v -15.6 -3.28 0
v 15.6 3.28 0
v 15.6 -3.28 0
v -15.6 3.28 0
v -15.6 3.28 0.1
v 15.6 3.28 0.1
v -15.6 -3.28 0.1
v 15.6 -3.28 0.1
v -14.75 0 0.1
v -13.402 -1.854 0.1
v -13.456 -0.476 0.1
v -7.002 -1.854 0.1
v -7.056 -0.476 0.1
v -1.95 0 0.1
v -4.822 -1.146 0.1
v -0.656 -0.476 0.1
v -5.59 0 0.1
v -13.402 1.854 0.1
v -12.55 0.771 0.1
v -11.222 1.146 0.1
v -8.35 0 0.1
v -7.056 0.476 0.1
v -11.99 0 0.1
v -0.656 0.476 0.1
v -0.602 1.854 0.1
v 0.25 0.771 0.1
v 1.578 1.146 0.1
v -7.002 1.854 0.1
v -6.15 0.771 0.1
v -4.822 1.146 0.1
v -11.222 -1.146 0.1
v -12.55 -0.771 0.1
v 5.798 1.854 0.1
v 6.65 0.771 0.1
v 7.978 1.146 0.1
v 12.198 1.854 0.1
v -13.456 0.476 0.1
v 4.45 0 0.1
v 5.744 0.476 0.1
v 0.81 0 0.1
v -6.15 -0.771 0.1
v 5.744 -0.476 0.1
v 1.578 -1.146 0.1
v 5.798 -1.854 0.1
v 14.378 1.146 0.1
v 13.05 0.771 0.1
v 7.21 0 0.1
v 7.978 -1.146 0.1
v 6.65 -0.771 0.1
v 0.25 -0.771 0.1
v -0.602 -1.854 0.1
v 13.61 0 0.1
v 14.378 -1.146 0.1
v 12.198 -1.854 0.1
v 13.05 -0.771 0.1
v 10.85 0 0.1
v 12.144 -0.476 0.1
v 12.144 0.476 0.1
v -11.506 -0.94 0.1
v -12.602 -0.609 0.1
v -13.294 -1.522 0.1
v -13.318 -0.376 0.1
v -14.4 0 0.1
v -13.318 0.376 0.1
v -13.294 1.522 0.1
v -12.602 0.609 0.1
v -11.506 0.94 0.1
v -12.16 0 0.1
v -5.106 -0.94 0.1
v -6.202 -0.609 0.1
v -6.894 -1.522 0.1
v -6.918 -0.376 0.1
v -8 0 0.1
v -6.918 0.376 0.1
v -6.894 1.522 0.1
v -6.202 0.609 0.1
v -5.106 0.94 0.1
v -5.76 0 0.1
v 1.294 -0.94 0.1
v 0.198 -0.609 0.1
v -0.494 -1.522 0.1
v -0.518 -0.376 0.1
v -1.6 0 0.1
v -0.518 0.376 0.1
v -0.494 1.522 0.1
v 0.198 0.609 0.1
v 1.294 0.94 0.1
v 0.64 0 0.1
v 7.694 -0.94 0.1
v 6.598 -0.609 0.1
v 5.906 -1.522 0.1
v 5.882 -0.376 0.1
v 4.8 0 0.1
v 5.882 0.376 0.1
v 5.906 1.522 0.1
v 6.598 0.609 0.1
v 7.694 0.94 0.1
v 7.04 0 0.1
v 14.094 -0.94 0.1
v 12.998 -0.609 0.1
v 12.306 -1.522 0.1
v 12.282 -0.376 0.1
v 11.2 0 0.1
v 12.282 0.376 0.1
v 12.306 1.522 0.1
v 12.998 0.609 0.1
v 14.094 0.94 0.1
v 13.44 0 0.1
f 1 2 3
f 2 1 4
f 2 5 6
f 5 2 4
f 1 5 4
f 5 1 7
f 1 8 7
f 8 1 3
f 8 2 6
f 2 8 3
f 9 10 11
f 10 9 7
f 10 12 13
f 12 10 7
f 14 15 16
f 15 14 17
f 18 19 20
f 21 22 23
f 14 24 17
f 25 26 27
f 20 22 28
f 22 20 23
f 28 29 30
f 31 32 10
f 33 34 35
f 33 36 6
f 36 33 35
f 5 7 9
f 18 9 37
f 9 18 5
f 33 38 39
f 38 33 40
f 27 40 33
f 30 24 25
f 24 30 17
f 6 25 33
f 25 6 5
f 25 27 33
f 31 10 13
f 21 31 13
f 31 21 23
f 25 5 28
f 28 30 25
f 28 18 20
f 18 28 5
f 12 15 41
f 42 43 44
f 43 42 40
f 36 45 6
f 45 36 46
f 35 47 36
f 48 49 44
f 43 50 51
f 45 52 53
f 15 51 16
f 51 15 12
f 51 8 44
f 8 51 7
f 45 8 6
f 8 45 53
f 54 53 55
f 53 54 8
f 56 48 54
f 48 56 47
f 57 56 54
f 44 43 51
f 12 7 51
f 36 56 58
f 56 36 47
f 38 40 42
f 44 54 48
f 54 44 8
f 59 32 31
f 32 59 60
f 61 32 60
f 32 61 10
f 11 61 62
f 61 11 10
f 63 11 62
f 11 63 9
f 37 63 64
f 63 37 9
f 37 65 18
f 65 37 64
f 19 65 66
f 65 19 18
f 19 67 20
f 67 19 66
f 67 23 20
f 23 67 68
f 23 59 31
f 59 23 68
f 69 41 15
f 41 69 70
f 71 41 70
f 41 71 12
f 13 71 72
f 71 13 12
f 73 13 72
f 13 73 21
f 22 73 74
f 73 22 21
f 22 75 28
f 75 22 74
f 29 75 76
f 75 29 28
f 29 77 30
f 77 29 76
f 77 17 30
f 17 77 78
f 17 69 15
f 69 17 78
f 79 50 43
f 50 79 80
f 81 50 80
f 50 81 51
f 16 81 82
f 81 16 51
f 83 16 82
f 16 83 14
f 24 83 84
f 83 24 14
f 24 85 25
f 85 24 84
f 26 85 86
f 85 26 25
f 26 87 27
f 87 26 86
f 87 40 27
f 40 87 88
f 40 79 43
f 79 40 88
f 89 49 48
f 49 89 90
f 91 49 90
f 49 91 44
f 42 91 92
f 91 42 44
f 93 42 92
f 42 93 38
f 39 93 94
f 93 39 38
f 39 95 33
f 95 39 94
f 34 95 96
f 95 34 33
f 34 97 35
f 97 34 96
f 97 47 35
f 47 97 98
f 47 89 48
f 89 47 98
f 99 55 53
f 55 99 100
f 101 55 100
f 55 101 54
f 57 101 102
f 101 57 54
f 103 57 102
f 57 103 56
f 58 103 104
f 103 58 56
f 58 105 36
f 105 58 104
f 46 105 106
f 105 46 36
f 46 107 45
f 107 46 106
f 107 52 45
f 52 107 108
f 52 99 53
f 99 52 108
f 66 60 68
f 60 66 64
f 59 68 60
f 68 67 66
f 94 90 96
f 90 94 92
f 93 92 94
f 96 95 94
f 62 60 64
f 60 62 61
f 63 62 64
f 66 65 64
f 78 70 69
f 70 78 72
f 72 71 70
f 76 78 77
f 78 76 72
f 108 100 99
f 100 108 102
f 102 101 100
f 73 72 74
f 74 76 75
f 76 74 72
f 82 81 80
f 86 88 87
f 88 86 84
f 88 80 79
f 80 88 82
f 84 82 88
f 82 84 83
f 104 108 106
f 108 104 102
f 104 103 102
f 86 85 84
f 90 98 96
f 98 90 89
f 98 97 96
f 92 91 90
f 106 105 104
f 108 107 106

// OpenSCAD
// file: ../p/4-4edge.scad
use <../lib.scad>
$fa=1; $fs=0.2;
function ldraw_lib__4_4edge(realsolid=false) = [
// 0 Circle 1.0
// 0 Name: 4-4edge.dat
// 0 Author: James Jessiman
// 0 !LDRAW_ORG Primitive UPDATE 2017-01
// 0 !LICENSE Licensed under CC BY 2.0 and CC BY 4.0 : see CAreadme.txt
// 
// 0 BFC CERTIFY CCW
  [0,"BFC","CERTIFY"],
  [0,"BFC","CCW"],
// 
// 0 !HISTORY 1998-12-15 [PTadmin] Official Update 1998-10
// 0 !HISTORY 2005-12-28 [PTadmin] Official Update 2005-01
// 0 !HISTORY 2007-06-24 [PTadmin] Header formatted for Contributor Agreement
// 0 !HISTORY 2008-07-01 [PTadmin] Official Update 2008-01
// 0 !HISTORY 2017-01-15 [Steffen] BFCed
// 0 !HISTORY 2017-12-30 [PTadmin] Official Update 2017-01
// 
// 
// 2 24 1 0 0 0.9239 0 0.3827
  [2,24,1,0,0,0.9239,0,0.3827],
// 2 24 0.9239 0 0.3827 0.7071 0 0.7071
  [2,24,0.9239,0,0.3827,0.7071,0,0.7071],
// 2 24 0.7071 0 0.7071 0.3827 0 0.9239
  [2,24,0.7071,0,0.7071,0.3827,0,0.9239],
// 2 24 0.3827 0 0.9239 0 0 1
  [2,24,0.3827,0,0.9239,0,0,1],
// 2 24 0 0 1 -0.3827 0 0.9239
  [2,24,0,0,1,-0.3827,0,0.9239],
// 2 24 -0.3827 0 0.9239 -0.7071 0 0.7071
  [2,24,-0.3827,0,0.9239,-0.7071,0,0.7071],
// 2 24 -0.7071 0 0.7071 -0.9239 0 0.3827
  [2,24,-0.7071,0,0.7071,-0.9239,0,0.3827],
// 2 24 -0.9239 0 0.3827 -1 0 -0
  [2,24,-0.9239,0,0.3827,-1,0,-0],
// 2 24 -1 0 -0 -0.9239 0 -0.3827
  [2,24,-1,0,-0,-0.9239,0,-0.3827],
// 2 24 -0.9239 0 -0.3827 -0.7071 0 -0.7071
  [2,24,-0.9239,0,-0.3827,-0.7071,0,-0.7071],
// 2 24 -0.7071 0 -0.7071 -0.3827 0 -0.9239
  [2,24,-0.7071,0,-0.7071,-0.3827,0,-0.9239],
// 2 24 -0.3827 0 -0.9239 0 0 -1
  [2,24,-0.3827,0,-0.9239,0,0,-1],
// 2 24 0 0 -1 0.3827 0 -0.9239
  [2,24,0,0,-1,0.3827,0,-0.9239],
// 2 24 0.3827 0 -0.9239 0.7071 0 -0.7071
  [2,24,0.3827,0,-0.9239,0.7071,0,-0.7071],
// 2 24 0.7071 0 -0.7071 0.9239 0 -0.3827
  [2,24,0.7071,0,-0.7071,0.9239,0,-0.3827],
// 2 24 0.9239 0 -0.3827 1 0 0
  [2,24,0.9239,0,-0.3827,1,0,0],
];
module ldraw_lib__4_4edge(step=0, col=false, unit=2/5, alt=false, line=0.2, solid=!$preview)
    makepoly(ldraw_lib__4_4edge(solid), step=step, col=col, unit=unit, alt=alt, line=line, solid=solid);
ldraw_lib__4_4edge(line=0.2);
// file: ../p/4-4disc.scad
use <../lib.scad>
$fa=1; $fs=0.2;
function ldraw_lib__4_4disc(realsolid=false) = [
// 0 Disc 1.0
// 0 Name: 4-4disc.dat
// 0 Author: James Jessiman
// 0 !LDRAW_ORG Primitive UPDATE 2002-02
// 0 !LICENSE Licensed under CC BY 2.0 and CC BY 4.0 : see CAreadme.txt
// 
// 0 BFC CERTIFY CCW
  [0,"BFC","CERTIFY"],
  [0,"BFC","CCW"],
// 
// 0 !HISTORY 1998-12-15 [PTadmin] Official Update 1998-10
// 0 !HISTORY 2002-03-23 [sbliss] Added BFC statement
// 0 !HISTORY 2002-04-25 [PTadmin] Official Update 2002-02
// 0 !HISTORY 2007-06-24 [PTadmin] Header formatted for Contributor Agreement
// 0 !HISTORY 2008-07-01 [PTadmin] Official Update 2008-01
// 
// 
// 3 16 0 0 0 1 0 0 0.9239 0 0.3827
  [3,16,0,0,0,1,0,0,0.9239,0,0.3827],
// 3 16 0 0 0 0.9239 0 0.3827 0.7071 0 0.7071
  [3,16,0,0,0,0.9239,0,0.3827,0.7071,0,0.7071],
// 3 16 0 0 0 0.7071 0 0.7071 0.3827 0 0.9239
  [3,16,0,0,0,0.7071,0,0.7071,0.3827,0,0.9239],
// 3 16 0 0 0 0.3827 0 0.9239 0 0 1
  [3,16,0,0,0,0.3827,0,0.9239,0,0,1],
// 3 16 0 0 0 0 0 1 -0.3827 0 0.9239
  [3,16,0,0,0,0,0,1,-0.3827,0,0.9239],
// 3 16 0 0 0 -0.3827 0 0.9239 -0.7071 0 0.7071
  [3,16,0,0,0,-0.3827,0,0.9239,-0.7071,0,0.7071],
// 3 16 0 0 0 -0.7071 0 0.7071 -0.9239 0 0.3827
  [3,16,0,0,0,-0.7071,0,0.7071,-0.9239,0,0.3827],
// 3 16 0 0 0 -0.9239 0 0.3827 -1 0 -0
  [3,16,0,0,0,-0.9239,0,0.3827,-1,0,-0],
// 3 16 0 0 0 -1 0 -0 -0.9239 0 -0.3827
  [3,16,0,0,0,-1,0,-0,-0.9239,0,-0.3827],
// 3 16 0 0 0 -0.9239 0 -0.3827 -0.7071 0 -0.7071
  [3,16,0,0,0,-0.9239,0,-0.3827,-0.7071,0,-0.7071],
// 3 16 0 0 0 -0.7071 0 -0.7071 -0.3827 0 -0.9239
  [3,16,0,0,0,-0.7071,0,-0.7071,-0.3827,0,-0.9239],
// 3 16 0 0 0 -0.3827 0 -0.9239 0 0 -1
  [3,16,0,0,0,-0.3827,0,-0.9239,0,0,-1],
// 3 16 0 0 0 0 0 -1 0.3827 0 -0.9239
  [3,16,0,0,0,0,0,-1,0.3827,0,-0.9239],
// 3 16 0 0 0 0.3827 0 -0.9239 0.7071 0 -0.7071
  [3,16,0,0,0,0.3827,0,-0.9239,0.7071,0,-0.7071],
// 3 16 0 0 0 0.7071 0 -0.7071 0.9239 0 -0.3827
  [3,16,0,0,0,0.7071,0,-0.7071,0.9239,0,-0.3827],
// 3 16 0 0 0 0.9239 0 -0.3827 1 0 0
  [3,16,0,0,0,0.9239,0,-0.3827,1,0,0],
// 0
];
module ldraw_lib__4_4disc(step=0, col=false, unit=2/5, alt=false, line=0.2, solid=!$preview)
    makepoly(ldraw_lib__4_4disc(solid), step=step, col=col, unit=unit, alt=alt, line=line, solid=solid);
ldraw_lib__4_4disc(line=0.2);
// file: ../p/4-4cyli.scad
use <../lib.scad>
$fa=1; $fs=0.2;
function ldraw_lib__4_4cyli(realsolid=false) = [
// 0 Cylinder 1.0
// 0 Name: 4-4cyli.dat
// 0 Author: James Jessiman
// 0 !LDRAW_ORG Primitive UPDATE 2005-01
// 0 !LICENSE Licensed under CC BY 2.0 and CC BY 4.0 : see CAreadme.txt
// 
// 0 BFC CERTIFY CCW
  [0,"BFC","CERTIFY"],
  [0,"BFC","CCW"],
// 
// 0 !HISTORY 1998-12-15 [PTadmin] Official Update 1998-10
// 0 !HISTORY 2002-03-23 [sbliss] Added BFC statement; merged headers from files in distributions LDraw 0.27 and Complete.
// 0 !HISTORY 2002-04-25 [PTadmin] Official Update 2002-02
// 0 !HISTORY 2004-12-14 [guyvivan] BFC CCW
// 0 !HISTORY 2005-12-28 [PTadmin] Official Update 2005-01
// 0 !HISTORY 2007-06-24 [PTadmin] Header formatted for Contributor Agreement
// 0 !HISTORY 2008-07-01 [PTadmin] Official Update 2008-01
// 
// 
// 4 16 1 1 0 0.9239 1 0.3827 0.9239 0 0.3827 1 0 0
  [4,16,1,1,0,0.9239,1,0.3827,0.9239,0,0.3827,1,0,0],
// 5 24 1 0 0 1 1 0 0.9239 0 0.3827 0.9239 0 -0.3827
  [5,24,1,0,0,1,1,0,0.9239,0,0.3827,0.9239,0,-0.3827],
// 4 16 0.9239 1 0.3827 0.7071 1 0.7071 0.7071 0 0.7071 0.9239 0 0.3827
  [4,16,0.9239,1,0.3827,0.7071,1,0.7071,0.7071,0,0.7071,0.9239,0,0.3827],
// 5 24 0.9239 0 0.3827 0.9239 1 0.3827 0.7071 0 0.7071 1 0 0
  [5,24,0.9239,0,0.3827,0.9239,1,0.3827,0.7071,0,0.7071,1,0,0],
// 4 16 0.7071 1 0.7071 0.3827 1 0.9239 0.3827 0 0.9239 0.7071 0 0.7071
  [4,16,0.7071,1,0.7071,0.3827,1,0.9239,0.3827,0,0.9239,0.7071,0,0.7071],
// 5 24 0.7071 0 0.7071 0.7071 1 0.7071 0.3827 0 0.9239 0.9239 0 0.3827
  [5,24,0.7071,0,0.7071,0.7071,1,0.7071,0.3827,0,0.9239,0.9239,0,0.3827],
// 4 16 0.3827 1 0.9239 0 1 1 0 0 1 0.3827 0 0.9239
  [4,16,0.3827,1,0.9239,0,1,1,0,0,1,0.3827,0,0.9239],
// 5 24 0.3827 0 0.9239 0.3827 1 0.9239 0 0 1 0.7071 0 0.7071
  [5,24,0.3827,0,0.9239,0.3827,1,0.9239,0,0,1,0.7071,0,0.7071],
// 4 16 0 1 1 -0.3827 1 0.9239 -0.3827 0 0.9239 0 0 1
  [4,16,0,1,1,-0.3827,1,0.9239,-0.3827,0,0.9239,0,0,1],
// 5 24 0 0 1 0 1 1 -0.3827 0 0.9239 0.3827 0 0.9239
  [5,24,0,0,1,0,1,1,-0.3827,0,0.9239,0.3827,0,0.9239],
// 4 16 -0.3827 1 0.9239 -0.7071 1 0.7071 -0.7071 0 0.7071 -0.3827 0 0.9239
  [4,16,-0.3827,1,0.9239,-0.7071,1,0.7071,-0.7071,0,0.7071,-0.3827,0,0.9239],
// 5 24 -0.3827 0 0.9239 -0.3827 1 0.9239 -0.7071 0 0.7071 0 0 1
  [5,24,-0.3827,0,0.9239,-0.3827,1,0.9239,-0.7071,0,0.7071,0,0,1],
// 4 16 -0.7071 1 0.7071 -0.9239 1 0.3827 -0.9239 0 0.3827 -0.7071 0 0.7071
  [4,16,-0.7071,1,0.7071,-0.9239,1,0.3827,-0.9239,0,0.3827,-0.7071,0,0.7071],
// 5 24 -0.7071 0 0.7071 -0.7071 1 0.7071 -0.9239 0 0.3827 -0.3827 0 0.9239
  [5,24,-0.7071,0,0.7071,-0.7071,1,0.7071,-0.9239,0,0.3827,-0.3827,0,0.9239],
// 4 16 -0.9239 1 0.3827 -1 1 0 -1 0 0 -0.9239 0 0.3827
  [4,16,-0.9239,1,0.3827,-1,1,0,-1,0,0,-0.9239,0,0.3827],
// 5 24 -0.9239 0 0.3827 -0.9239 1 0.3827 -1 0 0 -0.7071 0 0.7071
  [5,24,-0.9239,0,0.3827,-0.9239,1,0.3827,-1,0,0,-0.7071,0,0.7071],
// 4 16 -1 1 0 -0.9239 1 -0.3827 -0.9239 0 -0.3827 -1 0 0
  [4,16,-1,1,0,-0.9239,1,-0.3827,-0.9239,0,-0.3827,-1,0,0],
// 5 24 -1 0 0 -1 1 0 -0.9239 0 -0.3827 -0.9239 0 0.3827
  [5,24,-1,0,0,-1,1,0,-0.9239,0,-0.3827,-0.9239,0,0.3827],
// 4 16 -0.9239 1 -0.3827 -0.7071 1 -0.7071 -0.7071 0 -0.7071 -0.9239 0 -0.3827
  [4,16,-0.9239,1,-0.3827,-0.7071,1,-0.7071,-0.7071,0,-0.7071,-0.9239,0,-0.3827],
// 5 24 -0.9239 0 -0.3827 -0.9239 1 -0.3827 -0.7071 0 -0.7071 -1 0 0
  [5,24,-0.9239,0,-0.3827,-0.9239,1,-0.3827,-0.7071,0,-0.7071,-1,0,0],
// 4 16 -0.7071 1 -0.7071 -0.3827 1 -0.9239 -0.3827 0 -0.9239 -0.7071 0 -0.7071
  [4,16,-0.7071,1,-0.7071,-0.3827,1,-0.9239,-0.3827,0,-0.9239,-0.7071,0,-0.7071],
// 5 24 -0.7071 0 -0.7071 -0.7071 1 -0.7071 -0.3827 0 -0.9239 -0.9239 0 -0.3827
  [5,24,-0.7071,0,-0.7071,-0.7071,1,-0.7071,-0.3827,0,-0.9239,-0.9239,0,-0.3827],
// 4 16 -0.3827 1 -0.9239 0 1 -1 0 0 -1 -0.3827 0 -0.9239
  [4,16,-0.3827,1,-0.9239,0,1,-1,0,0,-1,-0.3827,0,-0.9239],
// 5 24 -0.3827 0 -0.9239 -0.3827 1 -0.9239 0 0 -1 -0.7071 0 -0.7071
  [5,24,-0.3827,0,-0.9239,-0.3827,1,-0.9239,0,0,-1,-0.7071,0,-0.7071],
// 4 16 0 1 -1 0.3827 1 -0.9239 0.3827 0 -0.9239 0 0 -1
  [4,16,0,1,-1,0.3827,1,-0.9239,0.3827,0,-0.9239,0,0,-1],
// 5 24 0 0 -1 0 1 -1 0.3827 0 -0.9239 -0.3827 0 -0.9239
  [5,24,0,0,-1,0,1,-1,0.3827,0,-0.9239,-0.3827,0,-0.9239],
// 4 16 0.3827 1 -0.9239 0.7071 1 -0.7071 0.7071 0 -0.7071 0.3827 0 -0.9239
  [4,16,0.3827,1,-0.9239,0.7071,1,-0.7071,0.7071,0,-0.7071,0.3827,0,-0.9239],
// 5 24 0.3827 0 -0.9239 0.3827 1 -0.9239 0.7071 0 -0.7071 0 0 -1
  [5,24,0.3827,0,-0.9239,0.3827,1,-0.9239,0.7071,0,-0.7071,0,0,-1],
// 4 16 0.7071 1 -0.7071 0.9239 1 -0.3827 0.9239 0 -0.3827 0.7071 0 -0.7071
  [4,16,0.7071,1,-0.7071,0.9239,1,-0.3827,0.9239,0,-0.3827,0.7071,0,-0.7071],
// 5 24 0.7071 0 -0.7071 0.7071 1 -0.7071 0.9239 0 -0.3827 0.3827 0 -0.9239
  [5,24,0.7071,0,-0.7071,0.7071,1,-0.7071,0.9239,0,-0.3827,0.3827,0,-0.9239],
// 4 16 0.9239 1 -0.3827 1 1 0 1 0 0 0.9239 0 -0.3827
  [4,16,0.9239,1,-0.3827,1,1,0,1,0,0,0.9239,0,-0.3827],
// 5 24 0.9239 0 -0.3827 0.9239 1 -0.3827 1 0 0 0.7071 0 -0.7071
  [5,24,0.9239,0,-0.3827,0.9239,1,-0.3827,1,0,0,0.7071,0,-0.7071],
// 0
];
module ldraw_lib__4_4cyli(step=0, col=false, unit=2/5, alt=false, line=0.2, solid=!$preview)
    makepoly(ldraw_lib__4_4cyli(solid), step=step, col=col, unit=unit, alt=alt, line=line, solid=solid);
ldraw_lib__4_4cyli(line=0.2);
// file: ../p/stud3.scad
use <../lib.scad>
use <4-4cyli.scad>
use <4-4disc.scad>
use <4-4edge.scad>
$fa=1; $fs=0.2;
function ldraw_lib__stud3(realsolid=false) = realsolid ? 
    [openscad(translate([0,0,-eps()], o=cylinder(4+eps(), r=4)),2)] : [
// 0 Stud Tube Solid
// 0 Name: stud3.dat
// 0 Author: James Jessiman
// 0 !LDRAW_ORG Primitive UPDATE 2012-01
// 0 !LICENSE Licensed under CC BY 2.0 and CC BY 4.0 : see CAreadme.txt
// 
// 0 BFC CERTIFY CCW
  [0,"BFC","CERTIFY"],
  [0,"BFC","CCW"],
// 
// 0 !HISTORY 2002-04-04 [sbliss] Modified for BFC compliance
// 0 !HISTORY 2002-04-25 [PTadmin] Official Update 2002-02
// 0 !HISTORY 2007-06-24 [PTadmin] Header formatted for Contributor Agreement
// 0 !HISTORY 2008-07-01 [PTadmin] Official Update 2008-01
// 0 !HISTORY 2012-02-16 [Philo] Changed to CCW
// 0 !HISTORY 2012-03-30 [PTadmin] Official Update 2012-01
// 
// 
// 1 16 0 -4 0 4 0 0 0 1 0 0 0 4 4-4edge.dat
  [1,16,0,-4,0,4,0,0,0,1,0,0,0,4, ldraw_lib__4_4edge(realsolid)],
// 1 16 0 0 0 4 0 0 0 1 0 0 0 4 4-4edge.dat
  [1,16,0,0,0,4,0,0,0,1,0,0,0,4, ldraw_lib__4_4edge(realsolid)],
// 1 16 0 -4 0 4 0 0 0 1 0 0 0 4 4-4disc.dat
  [1,16,0,-4,0,4,0,0,0,1,0,0,0,4, ldraw_lib__4_4disc(realsolid)],
// 1 16 0 -4 0 4 0 0 0 4 0 0 0 4 4-4cyli.dat
  [1,16,0,-4,0,4,0,0,0,4,0,0,0,4, ldraw_lib__4_4cyli(realsolid)],
];
module ldraw_lib__stud3(step=0, col=false, unit=2/5, alt=false, line=0.2, solid=!$preview)
    makepoly(ldraw_lib__stud3(solid), step=step, col=col, unit=unit, alt=alt, line=line, solid=solid);
ldraw_lib__stud3(line=0.2);
// file: ../p/stud.scad
use <../lib.scad>
use <4-4cyli.scad>
use <4-4disc.scad>
use <4-4edge.scad>
$fa=1; $fs=0.2;
function ldraw_lib__stud(realsolid=false) = realsolid ? 
    [openscad(translate([0,0,-eps()], o=cylinder(4+eps(), r=6)),2)] : [
// 0 Stud
// 0 Name: stud.dat
// 0 Author: James Jessiman
// 0 !LDRAW_ORG Primitive UPDATE 2012-01
// 0 !LICENSE Licensed under CC BY 2.0 and CC BY 4.0 : see CAreadme.txt
// 
// 0 BFC CERTIFY CCW
  [0,"BFC","CERTIFY"],
  [0,"BFC","CCW"],
// 
// 0 !HISTORY 2002-04-04 [sbliss] Modified for BFC compliance
// 0 !HISTORY 2002-04-25 [PTadmin] Official Update 2002-02
// 0 !HISTORY 2007-06-24 [PTadmin] Header formatted for Contributor Agreement
// 0 !HISTORY 2008-07-01 [PTadmin] Official Update 2008-01
// 0 !HISTORY 2012-02-16 [Philo] Changed to CCW
// 0 !HISTORY 2012-03-30 [PTadmin] Official Update 2012-01
// 
// 
// 1 16 0 0 0 6 0 0 0 1 0 0 0 6 4-4edge.dat
  [1,16,0,0,0,6,0,0,0,1,0,0,0,6, ldraw_lib__4_4edge(realsolid)],
// 1 16 0 -4 0 6 0 0 0 1 0 0 0 6 4-4edge.dat
  [1,16,0,-4,0,6,0,0,0,1,0,0,0,6, ldraw_lib__4_4edge(realsolid)],
// 1 16 0 0 0 6 0 0 0 -4 0 0 0 6 4-4cyli.dat
  [1,16,0,0,0,6,0,0,0,-4,0,0,0,6, ldraw_lib__4_4cyli(realsolid)],
// 1 16 0 -4 0 6 0 0 0 1 0 0 0 6 4-4disc.dat
  [1,16,0,-4,0,6,0,0,0,1,0,0,0,6, ldraw_lib__4_4disc(realsolid)],
];
module ldraw_lib__stud(step=0, col=false, unit=2/5, alt=false, line=0.2, solid=!$preview)
    makepoly(ldraw_lib__stud(solid), step=step, col=col, unit=unit, alt=alt, line=line, solid=solid);
ldraw_lib__stud(line=0.2);
// file: ../p/box5.scad
use <../lib.scad>
$fa=1; $fs=0.2;
function ldraw_lib__box5(realsolid=false) = [
// 0 Box with 5 Faces and All Edges
// 0 Name: box5.dat
// 0 Author: James Jessiman
// 0 !LDRAW_ORG Primitive UPDATE 2012-01
// 0 !LICENSE Licensed under CC BY 2.0 and CC BY 4.0 : see CAreadme.txt
// 
// 0 BFC CERTIFY CCW
  [0,"BFC","CERTIFY"],
  [0,"BFC","CCW"],
// 
// 0 !HISTORY 2002-04-03 [sbliss] Modified for BFC compliance
// 0 !HISTORY 2002-04-25 [PTadmin] Official Update 2002-02
// 0 !HISTORY 2007-06-24 [PTadmin] Header formatted for Contributor Agreement
// 0 !HISTORY 2008-07-01 [PTadmin] Official Update 2008-01
// 0 !HISTORY 2012-02-16 [Philo] Changed to CCW
// 0 !HISTORY 2012-03-30 [PTadmin] Official Update 2012-01
// 
// 
// 2 24 1 1 1 -1 1 1
  [2,24,1,1,1,-1,1,1],
// 2 24 -1 1 1 -1 1 -1
  [2,24,-1,1,1,-1,1,-1],
// 2 24 -1 1 -1 1 1 -1
  [2,24,-1,1,-1,1,1,-1],
// 2 24 1 1 -1 1 1 1
  [2,24,1,1,-1,1,1,1],
// 2 24 1 0 1 -1 0 1
  [2,24,1,0,1,-1,0,1],
// 2 24 -1 0 1 -1 0 -1
  [2,24,-1,0,1,-1,0,-1],
// 2 24 -1 0 -1 1 0 -1
  [2,24,-1,0,-1,1,0,-1],
// 2 24 1 0 -1 1 0 1
  [2,24,1,0,-1,1,0,1],
// 2 24 1 0 1 1 1 1
  [2,24,1,0,1,1,1,1],
// 2 24 -1 0 1 -1 1 1
  [2,24,-1,0,1,-1,1,1],
// 2 24 1 0 -1 1 1 -1
  [2,24,1,0,-1,1,1,-1],
// 2 24 -1 0 -1 -1 1 -1
  [2,24,-1,0,-1,-1,1,-1],
// 4 16 -1 1 1 1 1 1 1 1 -1 -1 1 -1
  [4,16,-1,1,1,1,1,1,1,1,-1,-1,1,-1],
// 4 16 -1 1 1 -1 0 1 1 0 1 1 1 1
  [4,16,-1,1,1,-1,0,1,1,0,1,1,1,1],
// 4 16 -1 1 -1 -1 0 -1 -1 0 1 -1 1 1
  [4,16,-1,1,-1,-1,0,-1,-1,0,1,-1,1,1],
// 4 16 1 1 -1 1 0 -1 -1 0 -1 -1 1 -1
  [4,16,1,1,-1,1,0,-1,-1,0,-1,-1,1,-1],
// 4 16 1 1 1 1 0 1 1 0 -1 1 1 -1
  [4,16,1,1,1,1,0,1,1,0,-1,1,1,-1],
];
module ldraw_lib__box5(step=0, col=false, unit=2/5, alt=false, line=0.2, solid=!$preview)
    makepoly(ldraw_lib__box5(solid), step=step, col=col, unit=unit, alt=alt, line=line, solid=solid);
ldraw_lib__box5(line=0.2);
// file: ../p/box4t.scad
use <../lib.scad>
$fa=1; $fs=0.2;
function ldraw_lib__box4t(realsolid=false) = [
// 0 Box with 4 Adjacent Faces and All Edges
// 0 Name: box4t.dat
// 0 Author: Tore Eriksson [Tore_Eriksson]
// 0 !LDRAW_ORG Primitive UPDATE 2003-02
// 0 !LICENSE Licensed under CC BY 2.0 and CC BY 4.0 : see CAreadme.txt
// 
// 0 BFC CERTIFY CCW
  [0,"BFC","CERTIFY"],
  [0,"BFC","CCW"],
// 
// 0 !HISTORY 1997-09-29 [PTadmin] Official Update 1997-15
// 0 !HISTORY 2002-08-31 [izanette] Modified with WINDZ for BFC compliance
// 0 !HISTORY 2003-08-01 [PTadmin] Official Update 2003-02
// 0 !HISTORY 2007-06-24 [PTadmin] Header formatted for Contributor Agreement
// 0 !HISTORY 2008-07-01 [PTadmin] Official Update 2008-01
// 
// 
// 2 24 1 1 1 -1 1 1
  [2,24,1,1,1,-1,1,1],
// 2 24 -1 1 1 -1 1 -1
  [2,24,-1,1,1,-1,1,-1],
// 2 24 -1 1 -1 1 1 -1
  [2,24,-1,1,-1,1,1,-1],
// 2 24 1 1 -1 1 1 1
  [2,24,1,1,-1,1,1,1],
// 2 24 1 0 1 -1 0 1
  [2,24,1,0,1,-1,0,1],
// 2 24 -1 0 1 -1 0 -1
  [2,24,-1,0,1,-1,0,-1],
// 2 24 -1 0 -1 1 0 -1
  [2,24,-1,0,-1,1,0,-1],
// 2 24 1 0 -1 1 0 1
  [2,24,1,0,-1,1,0,1],
// 2 24 1 0 1 1 1 1
  [2,24,1,0,1,1,1,1],
// 2 24 -1 0 1 -1 1 1
  [2,24,-1,0,1,-1,1,1],
// 2 24 1 0 -1 1 1 -1
  [2,24,1,0,-1,1,1,-1],
// 2 24 -1 0 -1 -1 1 -1
  [2,24,-1,0,-1,-1,1,-1],
// 4 16 1 1 1 1 1 -1 -1 1 -1 -1 1 1
  [4,16,1,1,1,1,1,-1,-1,1,-1,-1,1,1],
// 4 16 1 1 1 -1 1 1 -1 0 1 1 0 1
  [4,16,1,1,1,-1,1,1,-1,0,1,1,0,1],
// 4 16 -1 1 1 -1 1 -1 -1 0 -1 -1 0 1
  [4,16,-1,1,1,-1,1,-1,-1,0,-1,-1,0,1],
// 0 4 16 -1 1 -1 -1 0 -1 1 0 -1 1 1 -1
// 4 16 1 1 -1 1 1 1 1 0 1 1 0 -1
  [4,16,1,1,-1,1,1,1,1,0,1,1,0,-1],
// 0
];
module ldraw_lib__box4t(step=0, col=false, unit=2/5, alt=false, line=0.2, solid=!$preview)
    makepoly(ldraw_lib__box4t(solid), step=step, col=col, unit=unit, alt=alt, line=line, solid=solid);
ldraw_lib__box4t(line=0.2);
// file: s/3004s01.scad
use <../../lib.scad>
use <../../p/box4t.scad>
use <../../p/box5.scad>
use <../../p/stud.scad>
use <../../p/stud3.scad>
$fa=1; $fs=0.2;
function ldraw_lib__s__3004s01(realsolid=false) = [
// 0 ~Brick  1 x  2 without Front Face
// 0 Name: s\3004s01.dat
// 0 Author: James Jessiman
// 0 !LDRAW_ORG Subpart UPDATE 2003-03
// 0 !LICENSE Licensed under CC BY 2.0 and CC BY 4.0 : see CAreadme.txt
// 
// 0 BFC CERTIFY CCW
  [0,"BFC","CERTIFY"],
  [0,"BFC","CCW"],
// 
// 0 !HISTORY 2003-09-07 [jriley] Subfiling, BFC
// 0 !HISTORY 2003-12-19 [PTadmin] Official Update 2003-03
// 0 !HISTORY 2007-08-29 [PTadmin] Header formatted for Contributor Agreement
// 0 !HISTORY 2008-07-01 [PTadmin] Official Update 2008-01
// 
// 
// 1 16 0 4 0 1 0 0 0 -5 0 0 0 1 stud3.dat
  [1,16,0,4,0,1,0,0,0,-5,0,0,0,1, ldraw_lib__stud3(realsolid)],
// 0 BFC INVERTNEXT
  [0,"BFC","INVERTNEXT"],
// 1 16 0 24 0 16 0 0 0 -20 0 0 0 6 box5.dat
  [1,16,0,24,0,16,0,0,0,-20,0,0,0,6, ldraw_lib__box5(realsolid)],
// 4 16 20 24 10 16 24 6 -16 24 6 -20 24 10
  [4,16,20,24,10,16,24,6,-16,24,6,-20,24,10],
// 4 16 -20 24 10 -16 24 6 -16 24 -6 -20 24 -10
  [4,16,-20,24,10,-16,24,6,-16,24,-6,-20,24,-10],
// 4 16 -20 24 -10 -16 24 -6 16 24 -6 20 24 -10
  [4,16,-20,24,-10,-16,24,-6,16,24,-6,20,24,-10],
// 4 16 20 24 -10 16 24 -6 16 24 6 20 24 10
  [4,16,20,24,-10,16,24,-6,16,24,6,20,24,10],
// 1 16 0 24 0 20 0 0 0 -24 0 0 0 10 box4t.dat
  [1,16,0,24,0,20,0,0,0,-24,0,0,0,10, ldraw_lib__box4t(realsolid)],
// 1 16 10 0 0 1 0 0 0 1 0 0 0 1 stud.dat
  [1,16,10,0,0,1,0,0,0,1,0,0,0,1, ldraw_lib__stud(realsolid)],
// 1 16 -10 0 0 1 0 0 0 1 0 0 0 1 stud.dat
  [1,16,-10,0,0,1,0,0,0,1,0,0,0,1, ldraw_lib__stud(realsolid)],
// 0
];
module ldraw_lib__s__3004s01(step=0, col=false, unit=2/5, alt=false, line=0.2, solid=!$preview)
    makepoly(ldraw_lib__s__3004s01(solid), step=step, col=col, unit=unit, alt=alt, line=line, solid=solid);
ldraw_lib__s__3004s01(line=0.2);
// file: 3004.scad
use <../lib.scad>
use <s/3004s01.scad>
$fa=1; $fs=0.2;
function ldraw_lib__3004(realsolid=false) = [
// 0 Brick  1 x  2
// 0 Name: 3004.dat
// 0 Author: James Jessiman
// 0 !LDRAW_ORG Part UPDATE 2022-05
// 0 !LICENSE Licensed under CC BY 2.0 and CC BY 4.0 : see CAreadme.txt
// 
// 0 BFC CERTIFY CCW
  [0,"BFC","CERTIFY"],
  [0,"BFC","CCW"],
// 
// 0 !HISTORY 2001-10-26 [PTadmin] Official Update 2001-01
// 0 !HISTORY 2002-05-07 {unknown} BFC Certification
// 0 !HISTORY 2002-06-11 [PTadmin] Official Update 2002-03
// 0 !HISTORY 2007-05-07 [PTadmin] Header formatted for Contributor Agreement
// 0 !HISTORY 2008-07-01 [PTadmin] Official Update 2008-01
// 0 !HISTORY 2022-08-04 [MagFors] Using subfile
// 0 !HISTORY 2022-09-15 [PTadmin] Official Update 2022-05
// 
// 
// 1 16 0 0 0 1 0 0 0 1 0 0 0 1 s\3004s01.dat
  [1,16,0,0,0,1,0,0,0,1,0,0,0,1, ldraw_lib__s__3004s01(realsolid)],
// 4 16 -20 24 -10 20 24 -10 20 0 -10 -20 0 -10
  [4,16,-20,24,-10,20,24,-10,20,0,-10,-20,0,-10],
];
module ldraw_lib__3004(step=0, col=false, unit=2/5, alt=false, line=0.2, solid=!$preview)
    makepoly(ldraw_lib__3004(solid), step=step, col=col, unit=unit, alt=alt, line=line, solid=solid);
ldraw_lib__3004(line=0.2);
// file: ../p/box5-12.scad
use <../lib.scad>
$fa=1; $fs=0.2;
function ldraw_lib__box5_12(realsolid=false) = [
// 0 Box with 5 Faces without Any Edges
// 0 Name: box5-12.dat
// 0 Author: Chris Dee [cwdee]
// 0 !LDRAW_ORG Primitive UPDATE 2009-02
// 0 !LICENSE Licensed under CC BY 2.0 and CC BY 4.0 : see CAreadme.txt
// 
// 0 BFC CERTIFY CCW
  [0,"BFC","CERTIFY"],
  [0,"BFC","CCW"],
// 
// 0 !HISTORY 2009-09-03 [PTadmin] Official Update 2009-02
// 
// 
// 4 16 1 1 1 1 1 -1 -1 1 -1 -1 1 1
  [4,16,1,1,1,1,1,-1,-1,1,-1,-1,1,1],
// 4 16 -1 0 1 1 0 1 1 1 1 -1 1 1
  [4,16,-1,0,1,1,0,1,1,1,1,-1,1,1],
// 4 16 -1 0 -1 -1 0 1 -1 1 1 -1 1 -1
  [4,16,-1,0,-1,-1,0,1,-1,1,1,-1,1,-1],
// 4 16 1 0 -1 -1 0 -1 -1 1 -1 1 1 -1
  [4,16,1,0,-1,-1,0,-1,-1,1,-1,1,1,-1],
// 4 16 1 0 1 1 0 -1 1 1 -1 1 1 1
  [4,16,1,0,1,1,0,-1,1,1,-1,1,1,1],
// 0
];
module ldraw_lib__box5_12(step=0, col=false, unit=2/5, alt=false, line=0.2, solid=!$preview)
    makepoly(ldraw_lib__box5_12(solid), step=step, col=col, unit=unit, alt=alt, line=line, solid=solid);
ldraw_lib__box5_12(line=0.2);
// main file
use <../lib.scad>
use <../p/box5-12.scad>
$fa=1; $fs=0.2;
function ldraw_lib__168335m(realsolid=false) = [
// 0 Sticker  0.8 x  3.9 with  5 White Stars with Black Outline
// 0 Name: 168335m.dat
// 0 Author: Ulrich Röder [UR]
// 0 !LDRAW_ORG Part UPDATE 2018-02
// 0 !LICENSE Licensed under CC BY 2.0 and CC BY 4.0 : see CAreadme.txt
// 
// 0 BFC CERTIFY CCW
  [0,"BFC","CERTIFY"],
  [0,"BFC","CCW"],
// 
// 0 !KEYWORDS Set 5591
// 
// 0 !HISTORY 2018-12-08 [PTadmin] Official Update 2018-02
// 
// 
// 0 // Main
// 1 16 0 -0.25 0 39 0 0 0 0.25 0 0 0 8.2 box5-12.dat
  [1,16,0,-0.25,0,39,0,0,0,0.25,0,0,0,8.2, ldraw_lib__box5_12(realsolid)],
// 
// 0 // Red
// 4 4 -39 -.25 -8.2 -33.506 -.25 -4.636 -33.639 -.25 -1.191 -36.875 -.25 0
  [4,4,-39,-.25,-8.2,-33.506,-.25,-4.636,-33.639,-.25,-1.191,-36.875,-.25,0],
// 4 4 -33.506 -.25 -4.636 -39 -.25 -8.2 -17.506 -.25 -4.636 -17.639 -.25 -1.191
  [4,4,-33.506,-.25,-4.636,-39,-.25,-8.2,-17.506,-.25,-4.636,-17.639,-.25,-1.191],
// 4 4 -1.639 -.25 -1.191 -4.875 -.25 0 -13.974 -.25 0 -12.056 -.25 -2.865
  [4,4,-1.639,-.25,-1.191,-4.875,-.25,0,-13.974,-.25,0,-12.056,-.25,-2.865],
// 3 4 -33.506 -.25 4.636 -31.374 -.25 1.927 -28.056 -.25 2.865
  [3,4,-33.506,-.25,4.636,-31.374,-.25,1.927,-28.056,-.25,2.865],
// 3 4 -20.875 -.25 0 -17.639 -.25 1.191 -29.974 -.25 0
  [3,4,-20.875,-.25,0,-17.639,-.25,1.191,-29.974,-.25,0],
// 3 4 -4.875 -.25 0 -1.639 -.25 1.191 -13.974 -.25 0
  [3,4,-4.875,-.25,0,-1.639,-.25,1.191,-13.974,-.25,0],
// 3 4 -1.506 -.25 4.636 .626 -.25 1.927 3.944 -.25 2.865
  [3,4,-1.506,-.25,4.636,.626,-.25,1.927,3.944,-.25,2.865],
// 4 4 -17.639 -.25 1.191 -17.506 -.25 4.636 -28.056 -.25 2.865 -29.974 -.25 0
  [4,4,-17.639,-.25,1.191,-17.506,-.25,4.636,-28.056,-.25,2.865,-29.974,-.25,0],
// 3 4 -17.506 -.25 4.636 -15.374 -.25 1.927 -12.056 -.25 2.865
  [3,4,-17.506,-.25,4.636,-15.374,-.25,1.927,-12.056,-.25,2.865],
// 3 4 -28.056 -.25 -2.865 -31.374 -.25 -1.927 -33.506 -.25 -4.636
  [3,4,-28.056,-.25,-2.865,-31.374,-.25,-1.927,-33.506,-.25,-4.636],
// 3 4 14.494 -.25 4.636 16.626 -.25 1.927 19.944 -.25 2.865
  [3,4,14.494,-.25,4.636,16.626,-.25,1.927,19.944,-.25,2.865],
// 4 4 30.494 -.25 4.636 39 -.25 8.2 14.494 -.25 4.636 19.944 -.25 2.865
  [4,4,30.494,-.25,4.636,39,-.25,8.2,14.494,-.25,4.636,19.944,-.25,2.865],
// 3 4 -39 -.25 8.2 -39 -.25 -8.2 -36.875 -.25 0
  [3,4,-39,-.25,8.2,-39,-.25,-8.2,-36.875,-.25,0],
// 4 4 -33.639 -.25 1.191 -33.506 -.25 4.636 -39 -.25 8.2 -36.875 -.25 0
  [4,4,-33.639,-.25,1.191,-33.506,-.25,4.636,-39,-.25,8.2,-36.875,-.25,0],
// 4 4 11.125 -.25 0 14.361 -.25 1.191 14.494 -.25 4.636 2.026 -.25 0
  [4,4,11.125,-.25,0,14.361,-.25,1.191,14.494,-.25,4.636,2.026,-.25,0],
// 3 4 3.944 -.25 2.865 2.026 -.25 0 14.494 -.25 4.636
  [3,4,3.944,-.25,2.865,2.026,-.25,0,14.494,-.25,4.636],
// 4 4 -1.639 -.25 1.191 -1.506 -.25 4.636 -12.056 -.25 2.865 -13.974 -.25 0
  [4,4,-1.639,-.25,1.191,-1.506,-.25,4.636,-12.056,-.25,2.865,-13.974,-.25,0],
// 4 4 -39 -.25 8.2 -1.506 -.25 4.636 14.494 -.25 4.636 39 -.25 8.2
  [4,4,-39,-.25,8.2,-1.506,-.25,4.636,14.494,-.25,4.636,39,-.25,8.2],
// 3 4 -1.506 -.25 4.636 3.944 -.25 2.865 14.494 -.25 4.636
  [3,4,-1.506,-.25,4.636,3.944,-.25,2.865,14.494,-.25,4.636],
// 3 4 -28.056 -.25 -2.865 -33.506 -.25 -4.636 -17.639 -.25 -1.191
  [3,4,-28.056,-.25,-2.865,-33.506,-.25,-4.636,-17.639,-.25,-1.191],
// 4 4 -20.875 -.25 0 -29.974 -.25 0 -28.056 -.25 -2.865 -17.639 -.25 -1.191
  [4,4,-20.875,-.25,0,-29.974,-.25,0,-28.056,-.25,-2.865,-17.639,-.25,-1.191],
// 3 4 -1.506 -.25 4.636 -39 -.25 8.2 -17.506 -.25 4.636
  [3,4,-1.506,-.25,4.636,-39,-.25,8.2,-17.506,-.25,4.636],
// 3 4 -17.506 -.25 4.636 -12.056 -.25 2.865 -1.506 -.25 4.636
  [3,4,-17.506,-.25,4.636,-12.056,-.25,2.865,-1.506,-.25,4.636],
// 4 4 -33.506 -.25 4.636 -28.056 -.25 2.865 -17.506 -.25 4.636 -39 -.25 8.2
  [4,4,-33.506,-.25,4.636,-28.056,-.25,2.865,-17.506,-.25,4.636,-39,-.25,8.2],
// 3 4 -17.506 -.25 -4.636 -12.056 -.25 -2.865 -15.374 -.25 -1.927
  [3,4,-17.506,-.25,-4.636,-12.056,-.25,-2.865,-15.374,-.25,-1.927],
// 4 4 14.361 -.25 -1.191 2.026 -.25 0 3.944 -.25 -2.865 14.494 -.25 -4.636
  [4,4,14.361,-.25,-1.191,2.026,-.25,0,3.944,-.25,-2.865,14.494,-.25,-4.636],
// 4 4 35.944 -.25 2.865 39 -.25 8.2 30.494 -.25 4.636 32.626 -.25 1.927
  [4,4,35.944,-.25,2.865,39,-.25,8.2,30.494,-.25,4.636,32.626,-.25,1.927],
// 3 4 19.944 -.25 2.865 18.026 -.25 0 30.494 -.25 4.636
  [3,4,19.944,-.25,2.865,18.026,-.25,0,30.494,-.25,4.636],
// 3 4 19.944 -.25 -2.865 16.626 -.25 -1.927 14.494 -.25 -4.636
  [3,4,19.944,-.25,-2.865,16.626,-.25,-1.927,14.494,-.25,-4.636],
// 3 4 3.944 -.25 -2.865 .626 -.25 -1.927 -1.506 -.25 -4.636
  [3,4,3.944,-.25,-2.865,.626,-.25,-1.927,-1.506,-.25,-4.636],
// 3 4 35.944 -.25 2.865 34.026 -.25 0 35.944 -.25 -2.865
  [3,4,35.944,-.25,2.865,34.026,-.25,0,35.944,-.25,-2.865],
// 4 4 -12.056 -.25 -2.865 -17.506 -.25 -4.636 -1.506 -.25 -4.636 -1.639 -.25 -1.191
  [4,4,-12.056,-.25,-2.865,-17.506,-.25,-4.636,-1.506,-.25,-4.636,-1.639,-.25,-1.191],
// 4 4 -39 -.25 -8.2 39 -.25 -8.2 14.494 -.25 -4.636 -1.506 -.25 -4.636
  [4,4,-39,-.25,-8.2,39,-.25,-8.2,14.494,-.25,-4.636,-1.506,-.25,-4.636],
// 4 4 35.944 -.25 2.865 35.944 -.25 -2.865 39 -.25 -8.2 39 -.25 8.2
  [4,4,35.944,-.25,2.865,35.944,-.25,-2.865,39,-.25,-8.2,39,-.25,8.2],
// 4 4 32.626 -.25 -1.927 30.494 -.25 -4.636 39 -.25 -8.2 35.944 -.25 -2.865
  [4,4,32.626,-.25,-1.927,30.494,-.25,-4.636,39,-.25,-8.2,35.944,-.25,-2.865],
// 4 4 18.026 -.25 0 19.944 -.25 -2.865 30.494 -.25 -4.636 27.125 -.25 0
  [4,4,18.026,-.25,0,19.944,-.25,-2.865,30.494,-.25,-4.636,27.125,-.25,0],
// 3 4 30.361 -.25 -1.191 27.125 -.25 0 30.494 -.25 -4.636
  [3,4,30.361,-.25,-1.191,27.125,-.25,0,30.494,-.25,-4.636],
// 3 4 14.494 -.25 -4.636 3.944 -.25 -2.865 -1.506 -.25 -4.636
  [3,4,14.494,-.25,-4.636,3.944,-.25,-2.865,-1.506,-.25,-4.636],
// 3 4 -17.506 -.25 -4.636 -39 -.25 -8.2 -1.506 -.25 -4.636
  [3,4,-17.506,-.25,-4.636,-39,-.25,-8.2,-1.506,-.25,-4.636],
// 4 4 30.361 -.25 1.191 30.494 -.25 4.636 18.026 -.25 0 27.125 -.25 0
  [4,4,30.361,-.25,1.191,30.494,-.25,4.636,18.026,-.25,0,27.125,-.25,0],
// 3 4 11.125 -.25 0 2.026 -.25 0 14.361 -.25 -1.191
  [3,4,11.125,-.25,0,2.026,-.25,0,14.361,-.25,-1.191],
// 4 4 14.494 -.25 -4.636 39 -.25 -8.2 30.494 -.25 -4.636 19.944 -.25 -2.865
  [4,4,14.494,-.25,-4.636,39,-.25,-8.2,30.494,-.25,-4.636,19.944,-.25,-2.865],
// 
// 0 // Black
// 4 0 -31.506 -.25 -1.522 -31.374 -.25 -1.927 -28.056 -.25 -2.865 -28.764 -.25 -2.351
  [4,0,-31.506,-.25,-1.522,-31.374,-.25,-1.927,-28.056,-.25,-2.865,-28.764,-.25,-2.351],
// 4 0 -33.506 -.25 -4.636 -31.374 -.25 -1.927 -31.506 -.25 -1.522 -33.236 -.25 -3.804
  [4,0,-33.506,-.25,-4.636,-31.374,-.25,-1.927,-31.506,-.25,-1.522,-33.236,-.25,-3.804],
// 4 0 -33.639 -.25 -1.191 -33.506 -.25 -4.636 -33.236 -.25 -3.804 -33.294 -.25 -.94
  [4,0,-33.639,-.25,-1.191,-33.506,-.25,-4.636,-33.236,-.25,-3.804,-33.294,-.25,-.94],
// 4 0 -36.875 -.25 0 -33.639 -.25 -1.191 -33.294 -.25 -.94 -36 -.25 0
  [4,0,-36.875,-.25,0,-33.639,-.25,-1.191,-33.294,-.25,-.94,-36,-.25,0],
// 4 0 -33.639 -.25 1.191 -36.875 -.25 0 -36 -.25 0 -33.294 -.25 .94
  [4,0,-33.639,-.25,1.191,-36.875,-.25,0,-36,-.25,0,-33.294,-.25,.94],
// 4 0 -33.506 -.25 4.636 -33.639 -.25 1.191 -33.294 -.25 .94 -33.236 -.25 3.804
  [4,0,-33.506,-.25,4.636,-33.639,-.25,1.191,-33.294,-.25,.94,-33.236,-.25,3.804],
// 4 0 -31.374 -.25 1.927 -33.506 -.25 4.636 -33.236 -.25 3.804 -31.506 -.25 1.522
  [4,0,-31.374,-.25,1.927,-33.506,-.25,4.636,-33.236,-.25,3.804,-31.506,-.25,1.522],
// 4 0 -28.056 -.25 2.865 -31.374 -.25 1.927 -31.506 -.25 1.522 -28.764 -.25 2.351
  [4,0,-28.056,-.25,2.865,-31.374,-.25,1.927,-31.506,-.25,1.522,-28.764,-.25,2.351],
// 4 0 -29.974 -.25 0 -28.056 -.25 2.865 -28.764 -.25 2.351 -30.4 -.25 0
  [4,0,-29.974,-.25,0,-28.056,-.25,2.865,-28.764,-.25,2.351,-30.4,-.25,0],
// 4 0 -28.056 -.25 -2.865 -29.974 -.25 0 -30.4 -.25 0 -28.764 -.25 -2.351
  [4,0,-28.056,-.25,-2.865,-29.974,-.25,0,-30.4,-.25,0,-28.764,-.25,-2.351],
// 4 0 -15.506 -.25 -1.522 -15.374 -.25 -1.927 -12.056 -.25 -2.865 -12.764 -.25 -2.351
  [4,0,-15.506,-.25,-1.522,-15.374,-.25,-1.927,-12.056,-.25,-2.865,-12.764,-.25,-2.351],
// 4 0 -17.506 -.25 -4.636 -15.374 -.25 -1.927 -15.506 -.25 -1.522 -17.236 -.25 -3.804
  [4,0,-17.506,-.25,-4.636,-15.374,-.25,-1.927,-15.506,-.25,-1.522,-17.236,-.25,-3.804],
// 4 0 -17.639 -.25 -1.191 -17.506 -.25 -4.636 -17.236 -.25 -3.804 -17.294 -.25 -.94
  [4,0,-17.639,-.25,-1.191,-17.506,-.25,-4.636,-17.236,-.25,-3.804,-17.294,-.25,-.94],
// 4 0 -20.875 -.25 0 -17.639 -.25 -1.191 -17.294 -.25 -.94 -20 -.25 0
  [4,0,-20.875,-.25,0,-17.639,-.25,-1.191,-17.294,-.25,-.94,-20,-.25,0],
// 4 0 -17.639 -.25 1.191 -20.875 -.25 0 -20 -.25 0 -17.294 -.25 .94
  [4,0,-17.639,-.25,1.191,-20.875,-.25,0,-20,-.25,0,-17.294,-.25,.94],
// 4 0 -17.506 -.25 4.636 -17.639 -.25 1.191 -17.294 -.25 .94 -17.236 -.25 3.804
  [4,0,-17.506,-.25,4.636,-17.639,-.25,1.191,-17.294,-.25,.94,-17.236,-.25,3.804],
// 4 0 -15.374 -.25 1.927 -17.506 -.25 4.636 -17.236 -.25 3.804 -15.506 -.25 1.522
  [4,0,-15.374,-.25,1.927,-17.506,-.25,4.636,-17.236,-.25,3.804,-15.506,-.25,1.522],
// 4 0 -12.056 -.25 2.865 -15.374 -.25 1.927 -15.506 -.25 1.522 -12.764 -.25 2.351
  [4,0,-12.056,-.25,2.865,-15.374,-.25,1.927,-15.506,-.25,1.522,-12.764,-.25,2.351],
// 4 0 -13.974 -.25 0 -12.056 -.25 2.865 -12.764 -.25 2.351 -14.4 -.25 0
  [4,0,-13.974,-.25,0,-12.056,-.25,2.865,-12.764,-.25,2.351,-14.4,-.25,0],
// 4 0 -12.056 -.25 -2.865 -13.974 -.25 0 -14.4 -.25 0 -12.764 -.25 -2.351
  [4,0,-12.056,-.25,-2.865,-13.974,-.25,0,-14.4,-.25,0,-12.764,-.25,-2.351],
// 4 0 .494 -.25 -1.522 .626 -.25 -1.927 3.944 -.25 -2.865 3.236 -.25 -2.351
  [4,0,.494,-.25,-1.522,.626,-.25,-1.927,3.944,-.25,-2.865,3.236,-.25,-2.351],
// 4 0 -1.506 -.25 -4.636 .626 -.25 -1.927 .494 -.25 -1.522 -1.236 -.25 -3.804
  [4,0,-1.506,-.25,-4.636,.626,-.25,-1.927,.494,-.25,-1.522,-1.236,-.25,-3.804],
// 4 0 -1.639 -.25 -1.191 -1.506 -.25 -4.636 -1.236 -.25 -3.804 -1.294 -.25 -.94
  [4,0,-1.639,-.25,-1.191,-1.506,-.25,-4.636,-1.236,-.25,-3.804,-1.294,-.25,-.94],
// 4 0 -4.875 -.25 0 -1.639 -.25 -1.191 -1.294 -.25 -.94 -4 -.25 0
  [4,0,-4.875,-.25,0,-1.639,-.25,-1.191,-1.294,-.25,-.94,-4,-.25,0],
// 4 0 -1.639 -.25 1.191 -4.875 -.25 0 -4 -.25 0 -1.294 -.25 .94
  [4,0,-1.639,-.25,1.191,-4.875,-.25,0,-4,-.25,0,-1.294,-.25,.94],
// 4 0 -1.506 -.25 4.636 -1.639 -.25 1.191 -1.294 -.25 .94 -1.236 -.25 3.804
  [4,0,-1.506,-.25,4.636,-1.639,-.25,1.191,-1.294,-.25,.94,-1.236,-.25,3.804],
// 4 0 .626 -.25 1.927 -1.506 -.25 4.636 -1.236 -.25 3.804 .494 -.25 1.522
  [4,0,.626,-.25,1.927,-1.506,-.25,4.636,-1.236,-.25,3.804,.494,-.25,1.522],
// 4 0 3.944 -.25 2.865 .626 -.25 1.927 .494 -.25 1.522 3.236 -.25 2.351
  [4,0,3.944,-.25,2.865,.626,-.25,1.927,.494,-.25,1.522,3.236,-.25,2.351],
// 4 0 2.026 -.25 0 3.944 -.25 2.865 3.236 -.25 2.351 1.6 -.25 0
  [4,0,2.026,-.25,0,3.944,-.25,2.865,3.236,-.25,2.351,1.6,-.25,0],
// 4 0 3.944 -.25 -2.865 2.026 -.25 0 1.6 -.25 0 3.236 -.25 -2.351
  [4,0,3.944,-.25,-2.865,2.026,-.25,0,1.6,-.25,0,3.236,-.25,-2.351],
// 4 0 16.494 -.25 -1.522 16.626 -.25 -1.927 19.944 -.25 -2.865 19.236 -.25 -2.351
  [4,0,16.494,-.25,-1.522,16.626,-.25,-1.927,19.944,-.25,-2.865,19.236,-.25,-2.351],
// 4 0 14.494 -.25 -4.636 16.626 -.25 -1.927 16.494 -.25 -1.522 14.764 -.25 -3.804
  [4,0,14.494,-.25,-4.636,16.626,-.25,-1.927,16.494,-.25,-1.522,14.764,-.25,-3.804],
// 4 0 14.361 -.25 -1.191 14.494 -.25 -4.636 14.764 -.25 -3.804 14.706 -.25 -.94
  [4,0,14.361,-.25,-1.191,14.494,-.25,-4.636,14.764,-.25,-3.804,14.706,-.25,-.94],
// 4 0 11.125 -.25 0 14.361 -.25 -1.191 14.706 -.25 -.94 12 -.25 0
  [4,0,11.125,-.25,0,14.361,-.25,-1.191,14.706,-.25,-.94,12,-.25,0],
// 4 0 14.361 -.25 1.191 11.125 -.25 0 12 -.25 0 14.706 -.25 .94
  [4,0,14.361,-.25,1.191,11.125,-.25,0,12,-.25,0,14.706,-.25,.94],
// 4 0 14.494 -.25 4.636 14.361 -.25 1.191 14.706 -.25 .94 14.764 -.25 3.804
  [4,0,14.494,-.25,4.636,14.361,-.25,1.191,14.706,-.25,.94,14.764,-.25,3.804],
// 4 0 16.626 -.25 1.927 14.494 -.25 4.636 14.764 -.25 3.804 16.494 -.25 1.522
  [4,0,16.626,-.25,1.927,14.494,-.25,4.636,14.764,-.25,3.804,16.494,-.25,1.522],
// 4 0 19.944 -.25 2.865 16.626 -.25 1.927 16.494 -.25 1.522 19.236 -.25 2.351
  [4,0,19.944,-.25,2.865,16.626,-.25,1.927,16.494,-.25,1.522,19.236,-.25,2.351],
// 4 0 18.026 -.25 0 19.944 -.25 2.865 19.236 -.25 2.351 17.6 -.25 0
  [4,0,18.026,-.25,0,19.944,-.25,2.865,19.236,-.25,2.351,17.6,-.25,0],
// 4 0 19.944 -.25 -2.865 18.026 -.25 0 17.6 -.25 0 19.236 -.25 -2.351
  [4,0,19.944,-.25,-2.865,18.026,-.25,0,17.6,-.25,0,19.236,-.25,-2.351],
// 4 0 32.494 -.25 -1.522 32.626 -.25 -1.927 35.944 -.25 -2.865 35.236 -.25 -2.351
  [4,0,32.494,-.25,-1.522,32.626,-.25,-1.927,35.944,-.25,-2.865,35.236,-.25,-2.351],
// 4 0 30.494 -.25 -4.636 32.626 -.25 -1.927 32.494 -.25 -1.522 30.764 -.25 -3.804
  [4,0,30.494,-.25,-4.636,32.626,-.25,-1.927,32.494,-.25,-1.522,30.764,-.25,-3.804],
// 4 0 30.361 -.25 -1.191 30.494 -.25 -4.636 30.764 -.25 -3.804 30.706 -.25 -.94
  [4,0,30.361,-.25,-1.191,30.494,-.25,-4.636,30.764,-.25,-3.804,30.706,-.25,-.94],
// 4 0 27.125 -.25 0 30.361 -.25 -1.191 30.706 -.25 -.94 28 -.25 0
  [4,0,27.125,-.25,0,30.361,-.25,-1.191,30.706,-.25,-.94,28,-.25,0],
// 4 0 30.361 -.25 1.191 27.125 -.25 0 28 -.25 0 30.706 -.25 .94
  [4,0,30.361,-.25,1.191,27.125,-.25,0,28,-.25,0,30.706,-.25,.94],
// 4 0 30.494 -.25 4.636 30.361 -.25 1.191 30.706 -.25 .94 30.764 -.25 3.804
  [4,0,30.494,-.25,4.636,30.361,-.25,1.191,30.706,-.25,.94,30.764,-.25,3.804],
// 4 0 32.626 -.25 1.927 30.494 -.25 4.636 30.764 -.25 3.804 32.494 -.25 1.522
  [4,0,32.626,-.25,1.927,30.494,-.25,4.636,30.764,-.25,3.804,32.494,-.25,1.522],
// 4 0 35.944 -.25 2.865 32.626 -.25 1.927 32.494 -.25 1.522 35.236 -.25 2.351
  [4,0,35.944,-.25,2.865,32.626,-.25,1.927,32.494,-.25,1.522,35.236,-.25,2.351],
// 4 0 34.026 -.25 0 35.944 -.25 2.865 35.236 -.25 2.351 33.6 -.25 0
  [4,0,34.026,-.25,0,35.944,-.25,2.865,35.236,-.25,2.351,33.6,-.25,0],
// 4 0 35.944 -.25 -2.865 34.026 -.25 0 33.6 -.25 0 35.236 -.25 -2.351
  [4,0,35.944,-.25,-2.865,34.026,-.25,0,33.6,-.25,0,35.236,-.25,-2.351],
// 
// 0 // White
// 4 15 -30.4 -.25 0 -31.506 -.25 1.522 -33.294 -.25 .94 -31.506 -.25 -1.522
  [4,15,-30.4,-.25,0,-31.506,-.25,1.522,-33.294,-.25,.94,-31.506,-.25,-1.522],
// 3 15 -28.764 -.25 -2.351 -30.4 -.25 0 -31.506 -.25 -1.522
  [3,15,-28.764,-.25,-2.351,-30.4,-.25,0,-31.506,-.25,-1.522],
// 3 15 -30.4 -.25 0 -28.764 -.25 2.351 -31.506 -.25 1.522
  [3,15,-30.4,-.25,0,-28.764,-.25,2.351,-31.506,-.25,1.522],
// 4 15 16.494 -.25 1.522 14.706 -.25 .94 14.706 -.25 -.94 16.494 -.25 -1.522
  [4,15,16.494,-.25,1.522,14.706,-.25,.94,14.706,-.25,-.94,16.494,-.25,-1.522],
// 3 15 12 -.25 0 14.706 -.25 -.94 14.706 -.25 .94
  [3,15,12,-.25,0,14.706,-.25,-.94,14.706,-.25,.94],
// 3 15 16.494 -.25 1.522 14.764 -.25 3.804 14.706 -.25 .94
  [3,15,16.494,-.25,1.522,14.764,-.25,3.804,14.706,-.25,.94],
// 4 15 -33.236 -.25 -3.804 -31.506 -.25 -1.522 -33.294 -.25 .94 -33.294 -.25 -.94
  [4,15,-33.236,-.25,-3.804,-31.506,-.25,-1.522,-33.294,-.25,.94,-33.294,-.25,-.94],
// 3 15 -36 -.25 0 -33.294 -.25 -.94 -33.294 -.25 .94
  [3,15,-36,-.25,0,-33.294,-.25,-.94,-33.294,-.25,.94],
// 3 15 -31.506 -.25 1.522 -33.236 -.25 3.804 -33.294 -.25 .94
  [3,15,-31.506,-.25,1.522,-33.236,-.25,3.804,-33.294,-.25,.94],
// 4 15 -17.294 -.25 -.94 -15.506 -.25 -1.522 -12.764 -.25 -2.351 -14.4 -.25 0
  [4,15,-17.294,-.25,-.94,-15.506,-.25,-1.522,-12.764,-.25,-2.351,-14.4,-.25,0],
// 3 15 -17.294 -.25 -.94 -17.236 -.25 -3.804 -15.506 -.25 -1.522
  [3,15,-17.294,-.25,-.94,-17.236,-.25,-3.804,-15.506,-.25,-1.522],
// 4 15 -12.764 -.25 2.351 -15.506 -.25 1.522 -17.294 -.25 -.94 -14.4 -.25 0
  [4,15,-12.764,-.25,2.351,-15.506,-.25,1.522,-17.294,-.25,-.94,-14.4,-.25,0],
// 4 15 30.706 -.25 -.94 32.494 -.25 -1.522 35.236 -.25 -2.351 33.6 -.25 0
  [4,15,30.706,-.25,-.94,32.494,-.25,-1.522,35.236,-.25,-2.351,33.6,-.25,0],
// 3 15 30.706 -.25 -.94 30.764 -.25 -3.804 32.494 -.25 -1.522
  [3,15,30.706,-.25,-.94,30.764,-.25,-3.804,32.494,-.25,-1.522],
// 3 15 -20 -.25 0 -17.294 -.25 -.94 -17.294 -.25 .94
  [3,15,-20,-.25,0,-17.294,-.25,-.94,-17.294,-.25,.94],
// 4 15 -17.294 -.25 -.94 -15.506 -.25 1.522 -17.236 -.25 3.804 -17.294 -.25 .94
  [4,15,-17.294,-.25,-.94,-15.506,-.25,1.522,-17.236,-.25,3.804,-17.294,-.25,.94],
// 3 15 -1.294 -.25 -.94 -1.236 -.25 -3.804 .494 -.25 -1.522
  [3,15,-1.294,-.25,-.94,-1.236,-.25,-3.804,.494,-.25,-1.522],
// 4 15 -1.294 -.25 .94 1.6 -.25 0 3.236 -.25 2.351 .494 -.25 1.522
  [4,15,-1.294,-.25,.94,1.6,-.25,0,3.236,-.25,2.351,.494,-.25,1.522],
// 4 15 3.236 -.25 -2.351 1.6 -.25 0 -1.294 -.25 -.94 .494 -.25 -1.522
  [4,15,3.236,-.25,-2.351,1.6,-.25,0,-1.294,-.25,-.94,.494,-.25,-1.522],
// 4 15 -4 -.25 0 -1.294 -.25 -.94 1.6 -.25 0 -1.294 -.25 .94
  [4,15,-4,-.25,0,-1.294,-.25,-.94,1.6,-.25,0,-1.294,-.25,.94],
// 4 15 30.706 -.25 .94 30.706 -.25 -.94 33.6 -.25 0 32.494 -.25 1.522
  [4,15,30.706,-.25,.94,30.706,-.25,-.94,33.6,-.25,0,32.494,-.25,1.522],
// 3 15 30.706 -.25 .94 28 -.25 0 30.706 -.25 -.94
  [3,15,30.706,-.25,.94,28,-.25,0,30.706,-.25,-.94],
// 3 15 .494 -.25 1.522 -1.236 -.25 3.804 -1.294 -.25 .94
  [3,15,.494,-.25,1.522,-1.236,-.25,3.804,-1.294,-.25,.94],
// 4 15 16.494 -.25 1.522 16.494 -.25 -1.522 19.236 -.25 -2.351 17.6 -.25 0
  [4,15,16.494,-.25,1.522,16.494,-.25,-1.522,19.236,-.25,-2.351,17.6,-.25,0],
// 3 15 17.6 -.25 0 19.236 -.25 2.351 16.494 -.25 1.522
  [3,15,17.6,-.25,0,19.236,-.25,2.351,16.494,-.25,1.522],
// 3 15 14.706 -.25 -.94 14.764 -.25 -3.804 16.494 -.25 -1.522
  [3,15,14.706,-.25,-.94,14.764,-.25,-3.804,16.494,-.25,-1.522],
// 3 15 32.494 -.25 1.522 30.764 -.25 3.804 30.706 -.25 .94
  [3,15,32.494,-.25,1.522,30.764,-.25,3.804,30.706,-.25,.94],
// 3 15 33.6 -.25 0 35.236 -.25 2.351 32.494 -.25 1.522
  [3,15,33.6,-.25,0,35.236,-.25,2.351,32.494,-.25,1.522],
];
module ldraw_lib__168335m(step=0, col=false, unit=2/5, alt=false, line=0.2, solid=!$preview)
    makepoly(ldraw_lib__168335m(solid), step=step, col=col, unit=unit, alt=alt, line=line, solid=solid);
ldraw_lib__168335m(line=0.2);
